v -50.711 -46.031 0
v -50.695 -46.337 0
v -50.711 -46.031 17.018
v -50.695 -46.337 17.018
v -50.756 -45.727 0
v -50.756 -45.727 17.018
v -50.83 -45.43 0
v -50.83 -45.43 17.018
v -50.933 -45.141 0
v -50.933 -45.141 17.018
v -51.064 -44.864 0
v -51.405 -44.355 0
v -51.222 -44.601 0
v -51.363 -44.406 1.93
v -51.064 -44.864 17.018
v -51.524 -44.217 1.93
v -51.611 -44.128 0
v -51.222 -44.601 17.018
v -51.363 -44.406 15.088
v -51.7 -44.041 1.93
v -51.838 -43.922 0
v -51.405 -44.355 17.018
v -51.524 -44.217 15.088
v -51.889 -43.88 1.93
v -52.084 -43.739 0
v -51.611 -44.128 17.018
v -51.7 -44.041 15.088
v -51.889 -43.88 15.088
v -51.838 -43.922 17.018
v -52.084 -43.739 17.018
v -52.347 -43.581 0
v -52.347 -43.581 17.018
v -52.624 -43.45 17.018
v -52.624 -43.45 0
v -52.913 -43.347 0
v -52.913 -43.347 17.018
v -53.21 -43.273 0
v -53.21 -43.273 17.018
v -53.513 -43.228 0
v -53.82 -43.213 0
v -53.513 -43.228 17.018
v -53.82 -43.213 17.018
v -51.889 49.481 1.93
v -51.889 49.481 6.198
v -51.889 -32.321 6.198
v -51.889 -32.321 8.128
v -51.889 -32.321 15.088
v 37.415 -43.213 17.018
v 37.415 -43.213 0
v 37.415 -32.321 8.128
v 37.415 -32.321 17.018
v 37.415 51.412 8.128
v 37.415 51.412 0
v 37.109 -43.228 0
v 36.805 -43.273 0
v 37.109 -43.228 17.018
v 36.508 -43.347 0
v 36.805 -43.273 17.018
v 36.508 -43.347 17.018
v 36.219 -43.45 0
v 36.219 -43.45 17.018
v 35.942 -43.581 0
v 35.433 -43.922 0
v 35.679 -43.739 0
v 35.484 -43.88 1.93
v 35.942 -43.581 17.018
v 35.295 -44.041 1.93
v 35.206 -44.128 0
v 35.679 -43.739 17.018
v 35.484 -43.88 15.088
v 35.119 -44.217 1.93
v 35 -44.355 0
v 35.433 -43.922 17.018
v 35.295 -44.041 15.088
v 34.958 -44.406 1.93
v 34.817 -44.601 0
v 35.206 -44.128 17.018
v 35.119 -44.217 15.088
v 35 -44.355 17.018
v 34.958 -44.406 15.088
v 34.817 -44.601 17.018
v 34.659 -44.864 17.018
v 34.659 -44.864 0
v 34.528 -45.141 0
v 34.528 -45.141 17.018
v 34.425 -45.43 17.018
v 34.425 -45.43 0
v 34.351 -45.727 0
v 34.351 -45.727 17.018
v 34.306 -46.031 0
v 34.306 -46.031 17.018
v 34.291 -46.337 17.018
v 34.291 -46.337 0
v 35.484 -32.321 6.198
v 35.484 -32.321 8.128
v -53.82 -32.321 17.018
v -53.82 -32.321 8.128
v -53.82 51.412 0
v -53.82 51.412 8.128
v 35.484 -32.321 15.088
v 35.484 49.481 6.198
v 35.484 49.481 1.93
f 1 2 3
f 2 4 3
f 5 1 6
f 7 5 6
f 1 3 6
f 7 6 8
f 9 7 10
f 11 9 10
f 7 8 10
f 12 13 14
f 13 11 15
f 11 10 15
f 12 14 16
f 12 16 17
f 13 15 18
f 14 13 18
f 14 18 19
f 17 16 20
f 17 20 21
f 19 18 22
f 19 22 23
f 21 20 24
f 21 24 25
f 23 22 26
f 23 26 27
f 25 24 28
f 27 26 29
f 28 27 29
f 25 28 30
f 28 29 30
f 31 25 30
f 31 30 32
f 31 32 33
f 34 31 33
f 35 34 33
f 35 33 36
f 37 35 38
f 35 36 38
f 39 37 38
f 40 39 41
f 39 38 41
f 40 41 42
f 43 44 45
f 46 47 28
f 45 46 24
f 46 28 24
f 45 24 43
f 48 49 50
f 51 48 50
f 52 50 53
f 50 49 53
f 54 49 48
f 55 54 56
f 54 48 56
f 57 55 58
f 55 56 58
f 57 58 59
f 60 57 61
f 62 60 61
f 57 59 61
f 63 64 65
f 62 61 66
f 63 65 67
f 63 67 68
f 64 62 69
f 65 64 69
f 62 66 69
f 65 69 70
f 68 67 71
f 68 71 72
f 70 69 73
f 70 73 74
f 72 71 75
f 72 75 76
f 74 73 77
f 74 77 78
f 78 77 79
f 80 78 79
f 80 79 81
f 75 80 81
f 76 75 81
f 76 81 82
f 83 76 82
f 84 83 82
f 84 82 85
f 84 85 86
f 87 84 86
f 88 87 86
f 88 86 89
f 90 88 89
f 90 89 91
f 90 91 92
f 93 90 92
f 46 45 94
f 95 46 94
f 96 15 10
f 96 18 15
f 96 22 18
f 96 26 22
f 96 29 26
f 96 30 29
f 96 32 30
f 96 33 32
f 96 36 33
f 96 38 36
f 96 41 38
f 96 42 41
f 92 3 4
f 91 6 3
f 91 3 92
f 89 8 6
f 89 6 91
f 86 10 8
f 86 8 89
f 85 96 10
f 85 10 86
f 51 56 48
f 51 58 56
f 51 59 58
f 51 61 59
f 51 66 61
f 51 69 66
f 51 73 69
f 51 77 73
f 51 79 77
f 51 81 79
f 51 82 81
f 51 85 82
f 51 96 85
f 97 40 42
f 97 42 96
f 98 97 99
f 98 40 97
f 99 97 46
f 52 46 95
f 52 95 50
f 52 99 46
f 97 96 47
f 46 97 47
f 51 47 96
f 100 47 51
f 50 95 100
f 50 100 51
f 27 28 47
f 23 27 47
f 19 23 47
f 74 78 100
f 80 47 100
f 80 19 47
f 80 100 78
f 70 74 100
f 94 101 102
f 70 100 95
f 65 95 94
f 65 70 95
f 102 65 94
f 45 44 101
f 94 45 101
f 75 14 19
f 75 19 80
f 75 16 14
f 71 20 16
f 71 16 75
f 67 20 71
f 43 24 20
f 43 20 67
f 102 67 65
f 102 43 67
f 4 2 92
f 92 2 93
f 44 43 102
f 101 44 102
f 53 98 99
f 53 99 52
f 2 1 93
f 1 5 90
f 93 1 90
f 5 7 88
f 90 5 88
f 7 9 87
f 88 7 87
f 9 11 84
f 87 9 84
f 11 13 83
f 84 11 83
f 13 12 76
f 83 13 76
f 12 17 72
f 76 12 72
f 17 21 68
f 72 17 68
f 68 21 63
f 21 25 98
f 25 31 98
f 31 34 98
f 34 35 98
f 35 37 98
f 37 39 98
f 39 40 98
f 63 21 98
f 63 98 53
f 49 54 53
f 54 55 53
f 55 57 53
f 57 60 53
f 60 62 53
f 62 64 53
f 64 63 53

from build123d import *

# Parameters (mm, degrees)
F0_W     = 91.2344232202
F0_H     = 83.7330448863
F1_DEPTH = 8.128
F0_H_2   = 14.015381963
F2_DEPTH = 17.018
F3_T     = -1.9304
F4_D     = 6.2484


# Not quite as in the source:
# - a shell that OpenCascade refuses in one call is made with other operations: the cavity is built on its own and cut out


with BuildPart() as f1:
    # F0 (on Top) → F1 (new body)
    with BuildSketch(Plane.XY):
        with Locations((-8.2024671137, 9.545179052)):
            Rectangle(F0_W, F0_H)
    extrude(amount=F1_DEPTH)

    # F0 (on Top) → F2 (join)
    with BuildSketch(Plane.XY):
        with Locations((-8.2024671137, -39.3290343727)):
            Rectangle(F0_W, F0_H_2)
    extrude(amount=F2_DEPTH)

    # F3: a shell. OpenCascade refuses it in one call, so the cavity is built on its own and cut out:
    # the body offset inwards by the wall thickness, plus a prism from it out through each open face.
    f3_core = offset(f1.part, amount=F3_T, kind=Kind.INTERSECTION, mode=Mode.PRIVATE)
    f3_exits = [f3_core.faces().sort_by_distance(p)[0] for p in [
        (-8.202467, -34.251743, 10.6426),
    ]]
    add(f3_core, mode=Mode.SUBTRACT)
    extrude(f3_exits, amount=-F3_T, mode=Mode.SUBTRACT)

    # F4 (through all)
    with Locations(Plane(origin=(0, 0, 0), x_dir=(1, 0, 0), z_dir=(0, 0, -1))):
        with Locations((37.4147444963, 46.3367253542), (-53.8196787238, 46.3367253542)):
            Hole(F4_D / 2)


solid = f1.part
